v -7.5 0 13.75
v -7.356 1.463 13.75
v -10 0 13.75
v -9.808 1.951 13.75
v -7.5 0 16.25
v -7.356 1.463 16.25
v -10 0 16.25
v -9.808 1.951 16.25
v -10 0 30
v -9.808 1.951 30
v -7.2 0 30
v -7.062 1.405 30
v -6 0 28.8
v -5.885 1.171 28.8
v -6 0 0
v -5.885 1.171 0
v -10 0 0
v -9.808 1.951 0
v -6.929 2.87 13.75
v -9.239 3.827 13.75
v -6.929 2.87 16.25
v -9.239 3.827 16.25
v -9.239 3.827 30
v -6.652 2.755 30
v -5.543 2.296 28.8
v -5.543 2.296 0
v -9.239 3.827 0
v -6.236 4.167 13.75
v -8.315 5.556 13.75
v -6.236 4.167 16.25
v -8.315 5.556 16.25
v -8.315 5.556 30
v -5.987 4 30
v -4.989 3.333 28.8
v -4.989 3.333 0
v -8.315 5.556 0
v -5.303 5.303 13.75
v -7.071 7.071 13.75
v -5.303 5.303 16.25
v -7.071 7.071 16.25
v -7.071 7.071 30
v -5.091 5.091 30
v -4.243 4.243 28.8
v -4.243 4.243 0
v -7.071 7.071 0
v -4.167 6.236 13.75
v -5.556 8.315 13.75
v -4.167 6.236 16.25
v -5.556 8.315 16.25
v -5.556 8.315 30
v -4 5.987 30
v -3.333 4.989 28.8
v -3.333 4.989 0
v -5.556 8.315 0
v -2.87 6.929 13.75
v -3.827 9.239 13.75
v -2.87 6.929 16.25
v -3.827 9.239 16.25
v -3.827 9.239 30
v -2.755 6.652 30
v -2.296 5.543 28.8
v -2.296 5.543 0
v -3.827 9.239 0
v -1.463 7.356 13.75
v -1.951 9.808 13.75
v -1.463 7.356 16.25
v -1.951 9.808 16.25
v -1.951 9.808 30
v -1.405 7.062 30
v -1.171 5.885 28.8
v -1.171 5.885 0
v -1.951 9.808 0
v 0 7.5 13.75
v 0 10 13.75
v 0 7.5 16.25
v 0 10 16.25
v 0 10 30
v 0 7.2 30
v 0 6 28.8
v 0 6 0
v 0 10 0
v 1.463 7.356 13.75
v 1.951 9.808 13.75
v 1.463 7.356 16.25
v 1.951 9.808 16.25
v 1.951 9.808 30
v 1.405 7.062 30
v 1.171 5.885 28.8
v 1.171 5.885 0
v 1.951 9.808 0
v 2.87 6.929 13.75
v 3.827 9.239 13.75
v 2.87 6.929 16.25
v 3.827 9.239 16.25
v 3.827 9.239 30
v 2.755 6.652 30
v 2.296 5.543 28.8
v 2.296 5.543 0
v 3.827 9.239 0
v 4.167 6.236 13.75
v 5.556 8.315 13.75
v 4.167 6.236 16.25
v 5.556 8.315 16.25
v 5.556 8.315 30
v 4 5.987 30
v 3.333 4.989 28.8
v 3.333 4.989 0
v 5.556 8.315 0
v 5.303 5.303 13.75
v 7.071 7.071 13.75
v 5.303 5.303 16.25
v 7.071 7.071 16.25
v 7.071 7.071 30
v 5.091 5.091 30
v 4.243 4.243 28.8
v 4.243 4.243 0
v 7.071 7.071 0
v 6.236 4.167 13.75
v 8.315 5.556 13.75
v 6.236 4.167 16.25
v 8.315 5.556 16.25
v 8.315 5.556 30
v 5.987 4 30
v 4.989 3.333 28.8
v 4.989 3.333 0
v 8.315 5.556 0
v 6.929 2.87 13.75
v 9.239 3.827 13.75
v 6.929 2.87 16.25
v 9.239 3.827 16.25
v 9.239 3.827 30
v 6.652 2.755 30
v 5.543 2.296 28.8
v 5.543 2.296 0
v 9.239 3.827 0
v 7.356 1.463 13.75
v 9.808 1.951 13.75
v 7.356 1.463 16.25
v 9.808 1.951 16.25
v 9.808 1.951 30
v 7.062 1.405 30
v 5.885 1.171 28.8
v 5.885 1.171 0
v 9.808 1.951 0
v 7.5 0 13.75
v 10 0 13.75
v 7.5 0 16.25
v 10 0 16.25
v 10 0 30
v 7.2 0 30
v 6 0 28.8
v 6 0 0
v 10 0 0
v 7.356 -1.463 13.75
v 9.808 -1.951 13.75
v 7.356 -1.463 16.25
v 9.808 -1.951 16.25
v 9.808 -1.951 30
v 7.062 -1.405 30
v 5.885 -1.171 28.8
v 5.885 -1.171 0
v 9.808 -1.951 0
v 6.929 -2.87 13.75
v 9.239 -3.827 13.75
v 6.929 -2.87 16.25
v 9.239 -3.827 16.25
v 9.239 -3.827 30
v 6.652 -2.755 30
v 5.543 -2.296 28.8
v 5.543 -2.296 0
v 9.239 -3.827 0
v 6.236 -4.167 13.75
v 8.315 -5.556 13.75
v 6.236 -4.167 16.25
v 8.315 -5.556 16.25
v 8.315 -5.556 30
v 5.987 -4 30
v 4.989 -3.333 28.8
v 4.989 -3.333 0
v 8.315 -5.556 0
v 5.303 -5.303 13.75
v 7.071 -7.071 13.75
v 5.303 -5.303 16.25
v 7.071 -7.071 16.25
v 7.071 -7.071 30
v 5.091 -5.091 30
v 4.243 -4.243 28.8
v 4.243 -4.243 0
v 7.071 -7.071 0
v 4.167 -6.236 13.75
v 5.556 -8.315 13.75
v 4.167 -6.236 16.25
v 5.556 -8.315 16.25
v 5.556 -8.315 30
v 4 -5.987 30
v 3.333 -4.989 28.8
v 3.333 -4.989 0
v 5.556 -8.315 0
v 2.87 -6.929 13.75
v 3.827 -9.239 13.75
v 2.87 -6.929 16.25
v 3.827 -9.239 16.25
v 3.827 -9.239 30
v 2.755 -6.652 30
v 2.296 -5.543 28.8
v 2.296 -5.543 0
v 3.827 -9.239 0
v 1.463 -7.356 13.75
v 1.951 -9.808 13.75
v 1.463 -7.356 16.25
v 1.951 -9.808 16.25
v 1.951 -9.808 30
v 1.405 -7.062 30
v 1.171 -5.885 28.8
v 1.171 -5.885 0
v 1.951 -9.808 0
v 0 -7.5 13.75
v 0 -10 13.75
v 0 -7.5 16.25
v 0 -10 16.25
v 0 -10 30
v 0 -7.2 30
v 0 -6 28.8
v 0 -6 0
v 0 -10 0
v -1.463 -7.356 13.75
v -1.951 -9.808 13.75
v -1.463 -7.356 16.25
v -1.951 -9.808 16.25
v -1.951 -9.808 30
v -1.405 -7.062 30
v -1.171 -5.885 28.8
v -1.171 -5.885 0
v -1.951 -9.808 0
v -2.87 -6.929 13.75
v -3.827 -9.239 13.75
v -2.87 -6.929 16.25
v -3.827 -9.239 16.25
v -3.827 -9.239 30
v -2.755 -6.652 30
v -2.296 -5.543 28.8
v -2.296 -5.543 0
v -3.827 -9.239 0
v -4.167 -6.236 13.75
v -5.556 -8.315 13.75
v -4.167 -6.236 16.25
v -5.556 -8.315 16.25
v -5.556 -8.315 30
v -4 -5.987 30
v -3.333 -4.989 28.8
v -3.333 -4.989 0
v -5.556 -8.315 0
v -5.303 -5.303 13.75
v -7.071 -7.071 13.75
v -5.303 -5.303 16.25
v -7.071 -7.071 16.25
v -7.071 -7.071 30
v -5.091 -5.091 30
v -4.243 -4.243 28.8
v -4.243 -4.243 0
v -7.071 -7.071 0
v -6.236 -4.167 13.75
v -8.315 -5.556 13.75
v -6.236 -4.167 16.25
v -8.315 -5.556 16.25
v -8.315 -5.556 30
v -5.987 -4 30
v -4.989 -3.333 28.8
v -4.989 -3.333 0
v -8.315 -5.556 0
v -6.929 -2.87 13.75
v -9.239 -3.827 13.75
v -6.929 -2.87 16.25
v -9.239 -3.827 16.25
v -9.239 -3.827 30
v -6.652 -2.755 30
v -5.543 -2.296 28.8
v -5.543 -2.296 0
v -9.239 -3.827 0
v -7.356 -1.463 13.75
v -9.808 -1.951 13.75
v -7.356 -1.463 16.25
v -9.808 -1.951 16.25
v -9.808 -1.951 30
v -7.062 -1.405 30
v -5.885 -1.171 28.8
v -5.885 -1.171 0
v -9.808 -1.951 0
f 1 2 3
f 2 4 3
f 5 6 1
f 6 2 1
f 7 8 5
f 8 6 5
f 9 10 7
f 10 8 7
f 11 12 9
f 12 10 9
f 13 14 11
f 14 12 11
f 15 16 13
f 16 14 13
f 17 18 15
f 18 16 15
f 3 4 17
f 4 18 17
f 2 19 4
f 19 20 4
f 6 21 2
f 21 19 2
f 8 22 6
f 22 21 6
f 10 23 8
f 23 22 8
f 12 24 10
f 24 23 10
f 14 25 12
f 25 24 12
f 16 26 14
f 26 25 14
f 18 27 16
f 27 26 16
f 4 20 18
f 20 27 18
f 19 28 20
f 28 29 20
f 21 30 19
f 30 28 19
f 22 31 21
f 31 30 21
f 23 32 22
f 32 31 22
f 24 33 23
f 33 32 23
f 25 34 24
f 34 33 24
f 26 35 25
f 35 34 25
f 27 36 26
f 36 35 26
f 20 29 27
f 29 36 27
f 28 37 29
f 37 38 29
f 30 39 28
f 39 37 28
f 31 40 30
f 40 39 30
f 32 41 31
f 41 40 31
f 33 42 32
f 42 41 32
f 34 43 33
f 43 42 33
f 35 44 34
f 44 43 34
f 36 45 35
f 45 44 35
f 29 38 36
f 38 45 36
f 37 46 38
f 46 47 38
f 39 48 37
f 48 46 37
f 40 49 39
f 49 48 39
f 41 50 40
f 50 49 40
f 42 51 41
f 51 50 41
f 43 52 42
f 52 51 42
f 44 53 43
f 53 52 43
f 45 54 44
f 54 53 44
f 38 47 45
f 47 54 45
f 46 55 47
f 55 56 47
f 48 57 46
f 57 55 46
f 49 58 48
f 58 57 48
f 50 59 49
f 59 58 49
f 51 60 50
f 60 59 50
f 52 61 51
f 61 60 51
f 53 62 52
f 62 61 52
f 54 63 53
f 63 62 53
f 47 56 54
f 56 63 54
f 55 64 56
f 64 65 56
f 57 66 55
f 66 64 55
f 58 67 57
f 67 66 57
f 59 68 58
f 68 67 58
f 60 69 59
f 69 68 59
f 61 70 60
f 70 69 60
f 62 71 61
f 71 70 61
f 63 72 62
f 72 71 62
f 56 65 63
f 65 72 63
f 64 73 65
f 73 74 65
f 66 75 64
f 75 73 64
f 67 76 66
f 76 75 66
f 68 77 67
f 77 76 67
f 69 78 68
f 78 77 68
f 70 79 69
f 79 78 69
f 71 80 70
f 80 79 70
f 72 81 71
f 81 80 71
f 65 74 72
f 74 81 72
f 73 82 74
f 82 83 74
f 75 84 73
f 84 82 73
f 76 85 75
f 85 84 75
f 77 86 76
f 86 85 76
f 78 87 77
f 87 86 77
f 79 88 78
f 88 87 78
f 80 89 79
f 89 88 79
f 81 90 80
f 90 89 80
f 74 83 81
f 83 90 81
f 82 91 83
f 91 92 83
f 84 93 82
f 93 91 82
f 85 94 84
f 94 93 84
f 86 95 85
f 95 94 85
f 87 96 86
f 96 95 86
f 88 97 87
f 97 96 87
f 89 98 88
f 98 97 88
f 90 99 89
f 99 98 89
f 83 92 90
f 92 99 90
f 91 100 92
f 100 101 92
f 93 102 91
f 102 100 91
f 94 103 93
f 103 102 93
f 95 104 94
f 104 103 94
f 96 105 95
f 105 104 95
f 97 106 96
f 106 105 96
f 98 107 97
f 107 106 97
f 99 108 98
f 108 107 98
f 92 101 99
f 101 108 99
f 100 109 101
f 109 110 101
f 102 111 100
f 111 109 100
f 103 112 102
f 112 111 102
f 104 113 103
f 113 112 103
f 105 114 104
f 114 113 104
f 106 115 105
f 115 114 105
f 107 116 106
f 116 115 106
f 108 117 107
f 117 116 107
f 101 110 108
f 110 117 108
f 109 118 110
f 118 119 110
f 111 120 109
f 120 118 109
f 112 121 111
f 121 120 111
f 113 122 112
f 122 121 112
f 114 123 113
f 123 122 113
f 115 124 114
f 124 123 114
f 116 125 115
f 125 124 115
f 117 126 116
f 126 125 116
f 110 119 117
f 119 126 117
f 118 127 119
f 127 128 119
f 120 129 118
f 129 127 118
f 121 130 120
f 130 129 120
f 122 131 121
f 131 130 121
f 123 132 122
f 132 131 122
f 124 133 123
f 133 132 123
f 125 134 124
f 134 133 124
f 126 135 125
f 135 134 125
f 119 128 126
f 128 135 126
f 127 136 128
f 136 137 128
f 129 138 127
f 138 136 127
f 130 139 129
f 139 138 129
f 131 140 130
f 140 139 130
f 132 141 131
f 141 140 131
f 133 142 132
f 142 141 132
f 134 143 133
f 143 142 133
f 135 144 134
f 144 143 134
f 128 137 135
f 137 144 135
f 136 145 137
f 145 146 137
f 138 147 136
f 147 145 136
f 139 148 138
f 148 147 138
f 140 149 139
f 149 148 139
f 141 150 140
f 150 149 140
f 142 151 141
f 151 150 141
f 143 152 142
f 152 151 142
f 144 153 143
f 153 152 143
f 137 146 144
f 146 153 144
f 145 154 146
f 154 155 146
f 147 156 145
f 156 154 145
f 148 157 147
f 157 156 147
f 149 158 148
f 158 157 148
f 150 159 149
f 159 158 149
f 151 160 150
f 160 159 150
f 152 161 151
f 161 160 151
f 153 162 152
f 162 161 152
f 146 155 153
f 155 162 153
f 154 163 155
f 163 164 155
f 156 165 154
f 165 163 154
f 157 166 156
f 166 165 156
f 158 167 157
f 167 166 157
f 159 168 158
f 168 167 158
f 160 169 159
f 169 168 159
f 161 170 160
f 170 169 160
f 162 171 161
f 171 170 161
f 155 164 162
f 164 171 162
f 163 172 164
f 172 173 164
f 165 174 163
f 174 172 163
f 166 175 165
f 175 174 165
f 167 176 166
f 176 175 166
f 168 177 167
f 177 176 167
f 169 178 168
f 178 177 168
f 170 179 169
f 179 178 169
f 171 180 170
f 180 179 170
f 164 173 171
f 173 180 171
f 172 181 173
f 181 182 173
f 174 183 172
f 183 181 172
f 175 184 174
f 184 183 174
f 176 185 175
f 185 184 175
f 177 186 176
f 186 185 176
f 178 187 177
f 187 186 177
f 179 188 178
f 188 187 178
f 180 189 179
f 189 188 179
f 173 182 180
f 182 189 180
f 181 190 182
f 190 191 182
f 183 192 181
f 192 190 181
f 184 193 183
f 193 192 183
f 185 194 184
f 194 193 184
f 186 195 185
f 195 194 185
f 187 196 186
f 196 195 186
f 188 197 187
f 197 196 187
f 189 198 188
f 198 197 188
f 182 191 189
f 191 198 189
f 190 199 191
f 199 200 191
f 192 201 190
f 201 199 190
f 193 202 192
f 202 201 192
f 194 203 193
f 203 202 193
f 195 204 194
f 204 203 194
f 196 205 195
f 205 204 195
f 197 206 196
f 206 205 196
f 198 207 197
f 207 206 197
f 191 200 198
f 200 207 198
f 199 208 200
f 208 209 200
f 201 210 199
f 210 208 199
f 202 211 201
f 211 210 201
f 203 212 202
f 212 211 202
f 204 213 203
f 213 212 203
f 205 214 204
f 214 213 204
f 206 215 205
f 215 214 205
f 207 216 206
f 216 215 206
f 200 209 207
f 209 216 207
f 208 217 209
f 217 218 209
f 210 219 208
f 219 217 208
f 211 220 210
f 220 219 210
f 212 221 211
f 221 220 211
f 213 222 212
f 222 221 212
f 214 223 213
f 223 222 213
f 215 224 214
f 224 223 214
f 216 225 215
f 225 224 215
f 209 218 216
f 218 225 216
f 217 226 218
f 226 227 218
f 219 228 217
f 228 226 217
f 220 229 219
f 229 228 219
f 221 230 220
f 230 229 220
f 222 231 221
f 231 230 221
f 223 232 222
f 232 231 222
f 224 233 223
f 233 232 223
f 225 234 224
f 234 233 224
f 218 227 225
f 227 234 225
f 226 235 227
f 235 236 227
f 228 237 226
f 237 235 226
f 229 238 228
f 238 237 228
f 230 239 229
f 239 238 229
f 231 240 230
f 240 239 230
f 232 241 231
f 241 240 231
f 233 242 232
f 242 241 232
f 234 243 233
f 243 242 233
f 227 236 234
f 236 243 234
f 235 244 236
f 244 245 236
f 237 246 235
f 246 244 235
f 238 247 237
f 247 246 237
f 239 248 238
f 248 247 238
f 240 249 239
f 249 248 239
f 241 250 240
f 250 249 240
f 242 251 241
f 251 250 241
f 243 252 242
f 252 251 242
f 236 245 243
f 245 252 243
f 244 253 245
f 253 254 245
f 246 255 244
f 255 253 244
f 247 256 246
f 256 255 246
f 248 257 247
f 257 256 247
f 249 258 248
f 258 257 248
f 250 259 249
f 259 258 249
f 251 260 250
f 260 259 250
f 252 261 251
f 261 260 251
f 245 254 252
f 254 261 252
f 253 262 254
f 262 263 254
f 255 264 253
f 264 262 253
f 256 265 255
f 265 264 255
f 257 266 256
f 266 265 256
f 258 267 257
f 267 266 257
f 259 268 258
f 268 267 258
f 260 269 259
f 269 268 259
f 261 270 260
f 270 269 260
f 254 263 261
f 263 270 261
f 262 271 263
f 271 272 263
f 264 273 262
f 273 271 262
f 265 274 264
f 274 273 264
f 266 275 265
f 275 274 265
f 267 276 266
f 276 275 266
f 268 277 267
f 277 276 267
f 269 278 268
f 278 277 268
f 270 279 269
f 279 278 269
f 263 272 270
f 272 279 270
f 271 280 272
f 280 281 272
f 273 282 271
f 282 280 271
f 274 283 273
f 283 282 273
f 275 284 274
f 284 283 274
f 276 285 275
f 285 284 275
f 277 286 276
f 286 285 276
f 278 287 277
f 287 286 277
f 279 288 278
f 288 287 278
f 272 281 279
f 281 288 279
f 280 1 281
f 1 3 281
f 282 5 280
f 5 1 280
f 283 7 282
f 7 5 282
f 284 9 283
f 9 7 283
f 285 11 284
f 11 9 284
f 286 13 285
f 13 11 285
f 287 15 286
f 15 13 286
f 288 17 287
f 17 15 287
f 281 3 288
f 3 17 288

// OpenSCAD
$fn = 32;

// ----------------------------------------------------------------------
// Grooved revolve: thread_relief, bore R6
// ----------------------------------------------------------------------

// --- parameters (mm) ---
bore_r = 6;               // bore radius
outer_r = 10;             // outer radius of the body
total_h = 30;             // overall height, Z
wall = 4;                 // radial wall thickness
groove_w = 2.5;           // groove width
groove_d = 2.5;           // groove depth
grooves = 1;              // number of outer grooves
relief = 1.2;             // thread relief leg at the bore mouth
relief_angle = 45;        // thread relief chamfer angle, degrees
fit_tol = 0.02;           // declared fit tolerance (prompt contract)
free_tol = 0.2;           // declared free tolerance (prompt contract)

bbox_x = 2 * outer_r;  // full diameter
bore_d = 2 * bore_r;  // bore diameter
body_d = 2 * outer_r;  // body diameter
revolve_angle = 360;  // full turn around the Z axis

profile = [[6, 0], [10, 0], [10, 13.75], [7.5, 13.75], [7.5, 16.25], [10, 16.25], [10, 30], [7.2, 30], [6, 28.8]];  // primary outline, 9 points, counter clockwise

// --- the one profile operation ---
rotate_extrude(angle = revolve_angle) polygon(points = profile);
